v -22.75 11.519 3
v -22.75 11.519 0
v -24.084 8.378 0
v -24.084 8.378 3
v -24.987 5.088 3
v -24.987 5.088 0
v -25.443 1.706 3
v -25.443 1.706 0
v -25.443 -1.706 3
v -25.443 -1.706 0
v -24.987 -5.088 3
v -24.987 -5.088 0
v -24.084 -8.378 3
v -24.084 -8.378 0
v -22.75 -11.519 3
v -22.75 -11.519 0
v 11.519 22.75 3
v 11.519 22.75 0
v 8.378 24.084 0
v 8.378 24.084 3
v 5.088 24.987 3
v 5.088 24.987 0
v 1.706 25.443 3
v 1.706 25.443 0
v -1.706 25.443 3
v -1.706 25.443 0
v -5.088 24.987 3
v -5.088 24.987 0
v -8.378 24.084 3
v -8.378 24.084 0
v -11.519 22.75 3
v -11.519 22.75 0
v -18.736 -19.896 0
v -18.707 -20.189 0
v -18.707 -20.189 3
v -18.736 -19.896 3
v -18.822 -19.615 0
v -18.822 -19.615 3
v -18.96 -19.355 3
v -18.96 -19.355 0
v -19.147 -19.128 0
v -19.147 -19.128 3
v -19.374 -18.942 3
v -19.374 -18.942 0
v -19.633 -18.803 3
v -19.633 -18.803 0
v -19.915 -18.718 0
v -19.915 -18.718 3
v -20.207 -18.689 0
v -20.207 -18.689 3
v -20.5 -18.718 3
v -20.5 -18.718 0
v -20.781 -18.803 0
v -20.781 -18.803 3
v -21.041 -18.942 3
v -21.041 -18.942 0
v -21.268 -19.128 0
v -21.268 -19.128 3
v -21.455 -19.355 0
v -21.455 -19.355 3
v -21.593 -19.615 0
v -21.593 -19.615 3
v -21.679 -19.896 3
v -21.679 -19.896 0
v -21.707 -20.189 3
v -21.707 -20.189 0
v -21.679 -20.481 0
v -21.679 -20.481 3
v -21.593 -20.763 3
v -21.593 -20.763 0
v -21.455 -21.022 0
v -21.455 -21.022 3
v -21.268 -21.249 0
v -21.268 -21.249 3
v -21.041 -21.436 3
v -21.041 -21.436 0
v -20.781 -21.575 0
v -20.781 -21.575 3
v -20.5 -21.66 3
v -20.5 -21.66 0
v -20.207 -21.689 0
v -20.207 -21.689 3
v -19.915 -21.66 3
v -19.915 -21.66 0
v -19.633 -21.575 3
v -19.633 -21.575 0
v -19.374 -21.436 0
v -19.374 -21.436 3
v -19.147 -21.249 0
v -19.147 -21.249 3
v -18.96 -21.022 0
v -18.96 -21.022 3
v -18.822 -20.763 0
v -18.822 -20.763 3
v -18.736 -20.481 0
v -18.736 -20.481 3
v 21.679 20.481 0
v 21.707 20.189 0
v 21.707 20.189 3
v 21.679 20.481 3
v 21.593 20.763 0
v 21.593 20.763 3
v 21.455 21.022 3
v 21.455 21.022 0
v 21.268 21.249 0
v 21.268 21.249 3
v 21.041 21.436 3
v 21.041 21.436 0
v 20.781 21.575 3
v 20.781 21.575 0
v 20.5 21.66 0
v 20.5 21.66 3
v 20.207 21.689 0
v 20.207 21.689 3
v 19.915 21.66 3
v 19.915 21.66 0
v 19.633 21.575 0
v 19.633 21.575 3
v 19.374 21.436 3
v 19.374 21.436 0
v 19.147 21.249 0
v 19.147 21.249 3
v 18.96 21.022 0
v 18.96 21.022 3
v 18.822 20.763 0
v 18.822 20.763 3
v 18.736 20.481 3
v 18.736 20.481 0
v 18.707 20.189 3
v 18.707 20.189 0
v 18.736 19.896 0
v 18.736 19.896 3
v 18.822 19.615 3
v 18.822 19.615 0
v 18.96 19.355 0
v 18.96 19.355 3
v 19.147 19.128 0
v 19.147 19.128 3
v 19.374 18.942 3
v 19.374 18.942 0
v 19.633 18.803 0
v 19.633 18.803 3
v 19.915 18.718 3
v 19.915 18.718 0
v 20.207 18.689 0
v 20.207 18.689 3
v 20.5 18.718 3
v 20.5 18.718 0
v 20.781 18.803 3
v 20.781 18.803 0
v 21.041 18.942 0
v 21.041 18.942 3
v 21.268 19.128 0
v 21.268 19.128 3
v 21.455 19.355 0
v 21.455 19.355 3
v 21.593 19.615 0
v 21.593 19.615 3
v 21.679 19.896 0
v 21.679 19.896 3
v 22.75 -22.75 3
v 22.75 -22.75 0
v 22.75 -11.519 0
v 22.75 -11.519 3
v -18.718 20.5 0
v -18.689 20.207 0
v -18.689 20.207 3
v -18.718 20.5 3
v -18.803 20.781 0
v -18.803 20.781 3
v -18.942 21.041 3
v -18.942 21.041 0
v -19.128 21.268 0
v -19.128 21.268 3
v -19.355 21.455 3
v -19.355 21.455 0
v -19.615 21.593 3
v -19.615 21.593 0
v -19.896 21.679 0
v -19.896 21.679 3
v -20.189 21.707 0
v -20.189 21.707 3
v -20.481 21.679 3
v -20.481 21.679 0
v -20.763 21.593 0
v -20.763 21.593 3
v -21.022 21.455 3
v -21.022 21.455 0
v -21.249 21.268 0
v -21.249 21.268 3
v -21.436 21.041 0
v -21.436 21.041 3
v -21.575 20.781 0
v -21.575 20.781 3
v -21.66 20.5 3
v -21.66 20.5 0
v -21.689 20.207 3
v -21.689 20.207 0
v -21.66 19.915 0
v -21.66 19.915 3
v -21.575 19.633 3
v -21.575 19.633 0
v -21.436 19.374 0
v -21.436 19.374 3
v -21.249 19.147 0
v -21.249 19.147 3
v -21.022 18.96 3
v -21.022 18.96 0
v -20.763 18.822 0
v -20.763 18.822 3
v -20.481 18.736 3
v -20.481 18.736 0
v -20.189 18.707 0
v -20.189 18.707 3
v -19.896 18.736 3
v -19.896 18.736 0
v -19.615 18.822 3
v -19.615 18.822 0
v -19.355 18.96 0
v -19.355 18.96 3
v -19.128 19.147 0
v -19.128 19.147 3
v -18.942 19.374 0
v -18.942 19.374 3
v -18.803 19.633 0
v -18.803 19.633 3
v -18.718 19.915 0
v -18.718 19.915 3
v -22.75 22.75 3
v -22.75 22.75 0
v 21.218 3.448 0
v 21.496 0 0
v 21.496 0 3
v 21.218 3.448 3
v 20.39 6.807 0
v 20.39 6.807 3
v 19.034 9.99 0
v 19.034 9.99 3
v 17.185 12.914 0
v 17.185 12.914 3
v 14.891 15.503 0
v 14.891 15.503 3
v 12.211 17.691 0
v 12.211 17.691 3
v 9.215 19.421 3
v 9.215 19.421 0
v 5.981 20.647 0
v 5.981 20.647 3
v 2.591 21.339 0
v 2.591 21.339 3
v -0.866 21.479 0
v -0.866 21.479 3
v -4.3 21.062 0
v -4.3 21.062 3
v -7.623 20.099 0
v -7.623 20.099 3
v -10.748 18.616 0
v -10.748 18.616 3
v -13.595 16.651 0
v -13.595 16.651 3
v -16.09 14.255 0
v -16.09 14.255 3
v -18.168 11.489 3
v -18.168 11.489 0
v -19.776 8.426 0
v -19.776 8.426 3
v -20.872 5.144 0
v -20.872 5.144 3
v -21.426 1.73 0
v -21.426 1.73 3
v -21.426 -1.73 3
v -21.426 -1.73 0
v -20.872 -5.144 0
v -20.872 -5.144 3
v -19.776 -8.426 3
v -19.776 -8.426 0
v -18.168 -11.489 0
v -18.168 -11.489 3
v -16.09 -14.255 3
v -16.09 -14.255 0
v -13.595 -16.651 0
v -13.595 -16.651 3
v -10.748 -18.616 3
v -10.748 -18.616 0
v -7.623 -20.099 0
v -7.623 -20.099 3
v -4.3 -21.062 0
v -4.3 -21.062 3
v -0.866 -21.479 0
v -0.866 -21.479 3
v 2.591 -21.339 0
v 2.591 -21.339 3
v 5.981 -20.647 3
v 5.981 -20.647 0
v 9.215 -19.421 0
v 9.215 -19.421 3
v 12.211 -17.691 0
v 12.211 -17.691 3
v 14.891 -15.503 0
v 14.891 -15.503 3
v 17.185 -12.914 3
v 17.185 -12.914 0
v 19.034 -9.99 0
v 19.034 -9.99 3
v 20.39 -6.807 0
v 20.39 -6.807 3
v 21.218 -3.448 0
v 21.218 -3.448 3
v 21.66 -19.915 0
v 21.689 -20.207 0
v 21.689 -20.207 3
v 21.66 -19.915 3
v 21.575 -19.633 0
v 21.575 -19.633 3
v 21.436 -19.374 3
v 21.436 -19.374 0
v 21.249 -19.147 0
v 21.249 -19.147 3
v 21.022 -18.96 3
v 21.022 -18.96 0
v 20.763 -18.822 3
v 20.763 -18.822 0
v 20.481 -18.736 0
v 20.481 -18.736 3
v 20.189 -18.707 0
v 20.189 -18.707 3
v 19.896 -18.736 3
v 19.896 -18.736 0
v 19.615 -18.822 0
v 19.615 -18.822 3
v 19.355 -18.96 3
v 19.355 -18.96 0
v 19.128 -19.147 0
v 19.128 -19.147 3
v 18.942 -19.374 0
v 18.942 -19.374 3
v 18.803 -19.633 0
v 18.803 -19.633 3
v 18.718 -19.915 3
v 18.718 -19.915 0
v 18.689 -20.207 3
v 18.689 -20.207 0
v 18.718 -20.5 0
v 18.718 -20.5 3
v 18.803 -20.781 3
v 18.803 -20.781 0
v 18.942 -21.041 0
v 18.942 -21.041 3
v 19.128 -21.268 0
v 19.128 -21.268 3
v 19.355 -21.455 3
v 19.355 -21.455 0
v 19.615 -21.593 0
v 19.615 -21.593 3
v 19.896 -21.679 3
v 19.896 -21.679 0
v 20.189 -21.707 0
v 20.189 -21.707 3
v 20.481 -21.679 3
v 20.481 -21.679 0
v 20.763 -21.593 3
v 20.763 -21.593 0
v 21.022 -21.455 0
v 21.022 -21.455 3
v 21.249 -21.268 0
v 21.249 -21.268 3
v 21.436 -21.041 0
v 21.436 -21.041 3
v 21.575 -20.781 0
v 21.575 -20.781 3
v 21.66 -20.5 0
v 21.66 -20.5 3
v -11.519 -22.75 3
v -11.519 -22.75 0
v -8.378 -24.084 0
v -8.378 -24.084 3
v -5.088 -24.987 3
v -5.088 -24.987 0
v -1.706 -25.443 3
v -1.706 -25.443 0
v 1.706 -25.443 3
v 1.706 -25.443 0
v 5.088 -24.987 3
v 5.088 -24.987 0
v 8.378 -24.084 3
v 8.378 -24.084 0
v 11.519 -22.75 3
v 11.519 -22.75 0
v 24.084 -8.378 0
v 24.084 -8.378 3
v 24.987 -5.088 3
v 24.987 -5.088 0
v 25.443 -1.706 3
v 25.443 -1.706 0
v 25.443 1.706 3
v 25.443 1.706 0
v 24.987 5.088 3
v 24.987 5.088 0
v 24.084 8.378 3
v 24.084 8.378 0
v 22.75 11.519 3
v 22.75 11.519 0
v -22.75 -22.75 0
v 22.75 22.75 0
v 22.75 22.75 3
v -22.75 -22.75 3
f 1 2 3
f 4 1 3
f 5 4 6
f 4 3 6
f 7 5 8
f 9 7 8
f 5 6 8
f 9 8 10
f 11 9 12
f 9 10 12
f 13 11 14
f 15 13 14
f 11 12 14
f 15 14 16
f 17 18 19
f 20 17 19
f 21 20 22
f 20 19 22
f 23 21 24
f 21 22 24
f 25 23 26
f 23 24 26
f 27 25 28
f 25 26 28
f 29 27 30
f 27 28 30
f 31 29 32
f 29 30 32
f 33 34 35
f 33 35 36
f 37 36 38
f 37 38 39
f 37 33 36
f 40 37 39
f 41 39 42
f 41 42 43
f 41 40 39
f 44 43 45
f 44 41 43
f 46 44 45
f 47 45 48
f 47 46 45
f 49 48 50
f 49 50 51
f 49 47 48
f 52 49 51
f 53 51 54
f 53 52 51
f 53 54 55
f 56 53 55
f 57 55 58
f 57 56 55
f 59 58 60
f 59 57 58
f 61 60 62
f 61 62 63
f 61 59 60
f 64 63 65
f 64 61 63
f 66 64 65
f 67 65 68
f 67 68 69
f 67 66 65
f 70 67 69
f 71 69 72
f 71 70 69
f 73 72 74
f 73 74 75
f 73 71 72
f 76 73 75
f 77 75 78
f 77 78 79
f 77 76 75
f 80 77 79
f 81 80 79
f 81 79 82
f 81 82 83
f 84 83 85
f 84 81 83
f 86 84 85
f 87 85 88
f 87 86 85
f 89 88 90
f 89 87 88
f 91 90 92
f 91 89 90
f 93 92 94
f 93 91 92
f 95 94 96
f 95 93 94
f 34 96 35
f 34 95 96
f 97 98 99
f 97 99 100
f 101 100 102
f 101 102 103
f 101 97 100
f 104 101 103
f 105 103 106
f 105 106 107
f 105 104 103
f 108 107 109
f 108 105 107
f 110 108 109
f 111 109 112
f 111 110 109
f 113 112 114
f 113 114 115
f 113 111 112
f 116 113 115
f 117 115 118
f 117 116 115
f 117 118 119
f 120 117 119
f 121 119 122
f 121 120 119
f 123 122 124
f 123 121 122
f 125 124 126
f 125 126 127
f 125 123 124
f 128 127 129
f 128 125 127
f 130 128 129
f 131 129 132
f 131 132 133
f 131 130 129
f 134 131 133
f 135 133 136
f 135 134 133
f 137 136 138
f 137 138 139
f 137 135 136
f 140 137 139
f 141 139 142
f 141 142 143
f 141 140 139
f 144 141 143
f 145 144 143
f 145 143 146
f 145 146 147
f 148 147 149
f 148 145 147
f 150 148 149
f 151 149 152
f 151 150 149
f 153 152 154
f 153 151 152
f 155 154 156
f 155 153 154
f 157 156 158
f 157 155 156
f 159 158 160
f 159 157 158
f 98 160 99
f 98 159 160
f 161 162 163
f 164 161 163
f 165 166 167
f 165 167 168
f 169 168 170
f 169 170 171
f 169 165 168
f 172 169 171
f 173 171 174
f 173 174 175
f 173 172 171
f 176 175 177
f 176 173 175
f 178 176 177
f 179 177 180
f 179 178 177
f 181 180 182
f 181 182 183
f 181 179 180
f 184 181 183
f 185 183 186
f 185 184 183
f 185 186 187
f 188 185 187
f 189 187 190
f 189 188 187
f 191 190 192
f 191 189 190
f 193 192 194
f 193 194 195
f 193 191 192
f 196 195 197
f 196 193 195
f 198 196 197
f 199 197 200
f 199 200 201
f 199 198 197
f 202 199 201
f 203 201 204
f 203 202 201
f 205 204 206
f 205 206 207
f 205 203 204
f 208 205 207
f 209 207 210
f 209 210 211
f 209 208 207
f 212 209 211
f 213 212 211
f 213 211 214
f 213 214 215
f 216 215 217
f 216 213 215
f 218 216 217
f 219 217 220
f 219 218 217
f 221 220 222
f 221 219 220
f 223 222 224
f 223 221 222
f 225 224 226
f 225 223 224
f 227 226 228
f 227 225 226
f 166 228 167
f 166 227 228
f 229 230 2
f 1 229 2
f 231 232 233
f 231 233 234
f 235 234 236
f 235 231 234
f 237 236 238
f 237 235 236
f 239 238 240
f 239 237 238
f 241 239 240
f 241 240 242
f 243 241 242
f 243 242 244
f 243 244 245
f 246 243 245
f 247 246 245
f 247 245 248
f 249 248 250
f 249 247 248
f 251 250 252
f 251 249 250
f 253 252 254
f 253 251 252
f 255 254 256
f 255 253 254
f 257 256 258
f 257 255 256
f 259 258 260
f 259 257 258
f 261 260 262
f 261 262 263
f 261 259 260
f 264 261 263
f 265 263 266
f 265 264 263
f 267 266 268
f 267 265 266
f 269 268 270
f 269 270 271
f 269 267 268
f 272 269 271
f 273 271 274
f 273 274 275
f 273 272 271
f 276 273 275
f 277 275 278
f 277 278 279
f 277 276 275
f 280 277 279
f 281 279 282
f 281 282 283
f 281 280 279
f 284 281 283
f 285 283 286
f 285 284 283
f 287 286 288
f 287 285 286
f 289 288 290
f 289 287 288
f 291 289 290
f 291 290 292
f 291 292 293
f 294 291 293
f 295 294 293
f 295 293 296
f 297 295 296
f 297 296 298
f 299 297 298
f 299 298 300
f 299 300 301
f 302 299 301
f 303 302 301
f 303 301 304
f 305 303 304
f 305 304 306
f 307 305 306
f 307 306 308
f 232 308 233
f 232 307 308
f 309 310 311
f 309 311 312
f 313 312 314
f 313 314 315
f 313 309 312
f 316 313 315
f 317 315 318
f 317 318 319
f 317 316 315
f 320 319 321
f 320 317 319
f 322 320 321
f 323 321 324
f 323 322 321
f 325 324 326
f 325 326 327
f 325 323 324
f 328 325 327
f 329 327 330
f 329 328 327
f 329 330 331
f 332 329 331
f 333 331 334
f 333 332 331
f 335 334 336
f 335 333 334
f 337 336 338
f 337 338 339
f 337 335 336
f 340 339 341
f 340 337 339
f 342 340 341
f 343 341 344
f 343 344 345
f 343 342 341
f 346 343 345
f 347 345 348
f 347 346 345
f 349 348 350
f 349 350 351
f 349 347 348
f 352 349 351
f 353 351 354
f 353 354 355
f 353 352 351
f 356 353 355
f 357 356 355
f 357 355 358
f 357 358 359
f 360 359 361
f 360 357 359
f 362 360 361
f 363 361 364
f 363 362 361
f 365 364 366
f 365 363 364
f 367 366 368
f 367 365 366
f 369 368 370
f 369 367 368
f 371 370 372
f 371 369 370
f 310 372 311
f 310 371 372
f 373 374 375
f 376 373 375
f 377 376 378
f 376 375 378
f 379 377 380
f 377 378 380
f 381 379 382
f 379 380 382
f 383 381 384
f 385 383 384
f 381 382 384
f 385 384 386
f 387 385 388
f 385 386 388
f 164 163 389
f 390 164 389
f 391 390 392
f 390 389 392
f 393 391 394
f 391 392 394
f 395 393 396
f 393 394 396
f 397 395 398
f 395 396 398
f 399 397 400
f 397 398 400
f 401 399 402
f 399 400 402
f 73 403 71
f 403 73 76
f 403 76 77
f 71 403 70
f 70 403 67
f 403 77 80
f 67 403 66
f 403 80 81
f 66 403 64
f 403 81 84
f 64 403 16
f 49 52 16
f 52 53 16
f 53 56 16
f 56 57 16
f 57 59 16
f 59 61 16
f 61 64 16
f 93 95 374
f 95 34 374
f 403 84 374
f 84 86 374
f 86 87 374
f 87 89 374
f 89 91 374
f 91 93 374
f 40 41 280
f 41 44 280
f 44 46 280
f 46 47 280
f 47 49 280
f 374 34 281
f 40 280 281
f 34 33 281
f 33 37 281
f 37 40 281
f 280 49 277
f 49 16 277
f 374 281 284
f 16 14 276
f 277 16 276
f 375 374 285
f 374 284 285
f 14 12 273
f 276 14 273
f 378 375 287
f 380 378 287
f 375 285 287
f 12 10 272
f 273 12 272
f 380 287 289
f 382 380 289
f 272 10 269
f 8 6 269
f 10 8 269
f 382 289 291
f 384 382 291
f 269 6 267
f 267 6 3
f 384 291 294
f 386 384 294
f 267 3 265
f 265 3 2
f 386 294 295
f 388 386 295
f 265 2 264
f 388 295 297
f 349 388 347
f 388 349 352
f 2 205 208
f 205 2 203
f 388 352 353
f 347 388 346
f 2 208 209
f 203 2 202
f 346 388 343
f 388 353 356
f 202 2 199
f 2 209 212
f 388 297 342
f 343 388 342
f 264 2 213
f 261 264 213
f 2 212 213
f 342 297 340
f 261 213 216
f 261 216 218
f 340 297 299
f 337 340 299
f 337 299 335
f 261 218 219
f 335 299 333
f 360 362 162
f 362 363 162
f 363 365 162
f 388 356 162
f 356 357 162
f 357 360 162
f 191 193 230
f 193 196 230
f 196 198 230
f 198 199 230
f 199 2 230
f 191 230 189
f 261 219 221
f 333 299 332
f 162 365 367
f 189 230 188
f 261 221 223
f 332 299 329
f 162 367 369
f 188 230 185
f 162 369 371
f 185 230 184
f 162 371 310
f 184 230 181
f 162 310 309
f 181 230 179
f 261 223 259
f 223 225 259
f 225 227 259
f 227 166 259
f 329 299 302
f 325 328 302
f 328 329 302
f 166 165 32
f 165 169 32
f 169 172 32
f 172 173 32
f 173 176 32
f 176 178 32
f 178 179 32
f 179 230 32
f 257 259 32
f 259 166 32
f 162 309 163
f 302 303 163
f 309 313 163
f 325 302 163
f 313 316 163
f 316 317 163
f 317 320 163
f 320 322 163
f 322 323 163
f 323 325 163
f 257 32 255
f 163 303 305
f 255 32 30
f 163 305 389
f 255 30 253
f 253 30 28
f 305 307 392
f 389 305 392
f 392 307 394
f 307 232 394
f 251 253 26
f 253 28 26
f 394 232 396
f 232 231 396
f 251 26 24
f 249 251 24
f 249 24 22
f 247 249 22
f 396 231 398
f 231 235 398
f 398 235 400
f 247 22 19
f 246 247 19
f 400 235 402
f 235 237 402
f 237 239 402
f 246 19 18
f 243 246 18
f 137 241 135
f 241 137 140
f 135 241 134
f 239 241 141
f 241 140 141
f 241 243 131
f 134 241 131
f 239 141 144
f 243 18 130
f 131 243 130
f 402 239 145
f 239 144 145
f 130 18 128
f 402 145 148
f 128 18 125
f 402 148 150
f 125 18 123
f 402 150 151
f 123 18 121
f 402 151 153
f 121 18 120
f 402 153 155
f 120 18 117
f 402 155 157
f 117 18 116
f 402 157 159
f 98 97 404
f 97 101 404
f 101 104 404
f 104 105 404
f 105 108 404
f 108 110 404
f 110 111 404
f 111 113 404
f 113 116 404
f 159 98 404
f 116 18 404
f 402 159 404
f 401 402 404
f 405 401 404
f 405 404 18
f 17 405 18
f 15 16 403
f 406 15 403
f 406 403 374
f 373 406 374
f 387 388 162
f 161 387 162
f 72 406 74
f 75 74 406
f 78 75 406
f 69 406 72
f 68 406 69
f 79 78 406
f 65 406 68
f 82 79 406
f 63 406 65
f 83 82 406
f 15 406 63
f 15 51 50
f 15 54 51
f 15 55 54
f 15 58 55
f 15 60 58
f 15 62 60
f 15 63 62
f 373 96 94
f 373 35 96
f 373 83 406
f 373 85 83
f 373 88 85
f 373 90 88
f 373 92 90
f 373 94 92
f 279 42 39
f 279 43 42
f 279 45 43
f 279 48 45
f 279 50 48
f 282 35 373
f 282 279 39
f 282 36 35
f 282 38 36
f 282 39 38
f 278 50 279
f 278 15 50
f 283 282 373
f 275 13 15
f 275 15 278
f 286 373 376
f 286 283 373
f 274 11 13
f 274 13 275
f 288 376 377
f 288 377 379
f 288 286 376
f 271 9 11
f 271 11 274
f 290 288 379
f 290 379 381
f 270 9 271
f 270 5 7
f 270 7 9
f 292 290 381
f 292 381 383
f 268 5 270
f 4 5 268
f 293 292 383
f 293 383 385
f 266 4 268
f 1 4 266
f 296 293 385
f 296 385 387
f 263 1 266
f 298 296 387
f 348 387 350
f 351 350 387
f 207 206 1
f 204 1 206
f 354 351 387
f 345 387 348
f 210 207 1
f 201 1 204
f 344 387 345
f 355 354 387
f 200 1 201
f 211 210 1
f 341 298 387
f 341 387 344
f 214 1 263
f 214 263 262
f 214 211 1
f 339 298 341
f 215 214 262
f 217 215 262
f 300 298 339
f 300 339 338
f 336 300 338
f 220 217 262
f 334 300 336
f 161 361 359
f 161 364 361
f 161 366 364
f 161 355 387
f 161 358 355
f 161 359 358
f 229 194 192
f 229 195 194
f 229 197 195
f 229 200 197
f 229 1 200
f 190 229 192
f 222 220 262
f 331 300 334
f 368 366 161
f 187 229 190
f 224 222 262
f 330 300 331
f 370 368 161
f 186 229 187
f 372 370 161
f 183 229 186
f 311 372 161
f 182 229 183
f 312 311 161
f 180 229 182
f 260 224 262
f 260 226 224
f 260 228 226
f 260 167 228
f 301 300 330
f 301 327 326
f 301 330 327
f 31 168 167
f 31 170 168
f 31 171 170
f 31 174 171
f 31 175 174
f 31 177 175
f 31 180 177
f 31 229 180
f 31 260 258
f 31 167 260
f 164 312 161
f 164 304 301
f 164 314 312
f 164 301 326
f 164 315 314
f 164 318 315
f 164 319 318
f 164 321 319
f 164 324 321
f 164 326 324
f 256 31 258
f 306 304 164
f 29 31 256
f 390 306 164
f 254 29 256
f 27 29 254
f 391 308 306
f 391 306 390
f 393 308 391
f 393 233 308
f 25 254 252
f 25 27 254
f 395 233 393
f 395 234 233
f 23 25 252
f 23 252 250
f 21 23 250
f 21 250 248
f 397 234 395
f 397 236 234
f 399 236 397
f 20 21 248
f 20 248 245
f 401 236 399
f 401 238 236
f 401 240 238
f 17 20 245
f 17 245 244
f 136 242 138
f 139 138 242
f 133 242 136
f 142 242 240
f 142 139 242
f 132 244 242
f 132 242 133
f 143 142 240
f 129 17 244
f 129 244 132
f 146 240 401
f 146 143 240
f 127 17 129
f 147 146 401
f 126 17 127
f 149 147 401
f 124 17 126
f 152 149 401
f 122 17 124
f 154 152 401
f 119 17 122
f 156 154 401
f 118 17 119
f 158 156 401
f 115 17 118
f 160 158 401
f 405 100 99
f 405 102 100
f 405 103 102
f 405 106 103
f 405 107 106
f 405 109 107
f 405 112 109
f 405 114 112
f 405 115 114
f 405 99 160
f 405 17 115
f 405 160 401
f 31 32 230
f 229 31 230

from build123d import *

# Parameters (mm, degrees)
SKETCH1_R           = 1.5
SKETCH1_R_2         = 21.49615086
BOSS_EXTRUDE1_DEPTH = 3


with BuildPart() as part:
    # Sketch1 → Boss-Extrude1 (new body)
    # profile 1 of 2: a face of its own
    with BuildSketch(Plane.XY):
        with BuildLine():
            Line((22.75, -22.75), (22.75, -11.519006034))
            ThreePointArc((22.75, -11.519006034), (25.5, 0), (22.75, 11.519006034))
            Line((22.75, 11.519006034), (22.75, 22.75))
            Line((22.75, 22.75), (11.519006034, 22.75))
            ThreePointArc((11.519006034, 22.75), (0, 25.5), (-11.519006034, 22.75))
            Line((-11.519006034, 22.75), (-22.75, 22.75))
            Line((-22.75, 22.75), (-22.75, 11.519006034))
            ThreePointArc((-22.75, 11.519006034), (-18.03122292, -18.03122292), (11.519006034, -22.75))
            Line((11.519006034, -22.75), (22.75, -22.75))
        make_face()
        with Locations((20.207389371, 20.188817575)):
            Circle(SKETCH1_R, mode=Mode.SUBTRACT)
        with Locations((-20.188817575, 20.207389371)):
            Circle(SKETCH1_R, mode=Mode.SUBTRACT)
        with Locations((20.188817575, -20.207389371)):
            Circle(SKETCH1_R, mode=Mode.SUBTRACT)
        Circle(SKETCH1_R_2, mode=Mode.SUBTRACT)
    # profile 2 of 2: a face of its own
    with BuildSketch(Plane.XY):
        with BuildLine():
            Line((-22.75, -22.75), (-11.519006034, -22.75))
            ThreePointArc((-11.519006034, -22.75), (-18.03122292, -18.03122292), (-22.75, -11.519006034))
            Line((-22.75, -11.519006034), (-22.75, -22.75))
        make_face()
        with Locations((-20.207389371, -20.188817575)):
            Circle(SKETCH1_R, mode=Mode.SUBTRACT)
    extrude(amount=BOSS_EXTRUDE1_DEPTH)


solid = part.part
